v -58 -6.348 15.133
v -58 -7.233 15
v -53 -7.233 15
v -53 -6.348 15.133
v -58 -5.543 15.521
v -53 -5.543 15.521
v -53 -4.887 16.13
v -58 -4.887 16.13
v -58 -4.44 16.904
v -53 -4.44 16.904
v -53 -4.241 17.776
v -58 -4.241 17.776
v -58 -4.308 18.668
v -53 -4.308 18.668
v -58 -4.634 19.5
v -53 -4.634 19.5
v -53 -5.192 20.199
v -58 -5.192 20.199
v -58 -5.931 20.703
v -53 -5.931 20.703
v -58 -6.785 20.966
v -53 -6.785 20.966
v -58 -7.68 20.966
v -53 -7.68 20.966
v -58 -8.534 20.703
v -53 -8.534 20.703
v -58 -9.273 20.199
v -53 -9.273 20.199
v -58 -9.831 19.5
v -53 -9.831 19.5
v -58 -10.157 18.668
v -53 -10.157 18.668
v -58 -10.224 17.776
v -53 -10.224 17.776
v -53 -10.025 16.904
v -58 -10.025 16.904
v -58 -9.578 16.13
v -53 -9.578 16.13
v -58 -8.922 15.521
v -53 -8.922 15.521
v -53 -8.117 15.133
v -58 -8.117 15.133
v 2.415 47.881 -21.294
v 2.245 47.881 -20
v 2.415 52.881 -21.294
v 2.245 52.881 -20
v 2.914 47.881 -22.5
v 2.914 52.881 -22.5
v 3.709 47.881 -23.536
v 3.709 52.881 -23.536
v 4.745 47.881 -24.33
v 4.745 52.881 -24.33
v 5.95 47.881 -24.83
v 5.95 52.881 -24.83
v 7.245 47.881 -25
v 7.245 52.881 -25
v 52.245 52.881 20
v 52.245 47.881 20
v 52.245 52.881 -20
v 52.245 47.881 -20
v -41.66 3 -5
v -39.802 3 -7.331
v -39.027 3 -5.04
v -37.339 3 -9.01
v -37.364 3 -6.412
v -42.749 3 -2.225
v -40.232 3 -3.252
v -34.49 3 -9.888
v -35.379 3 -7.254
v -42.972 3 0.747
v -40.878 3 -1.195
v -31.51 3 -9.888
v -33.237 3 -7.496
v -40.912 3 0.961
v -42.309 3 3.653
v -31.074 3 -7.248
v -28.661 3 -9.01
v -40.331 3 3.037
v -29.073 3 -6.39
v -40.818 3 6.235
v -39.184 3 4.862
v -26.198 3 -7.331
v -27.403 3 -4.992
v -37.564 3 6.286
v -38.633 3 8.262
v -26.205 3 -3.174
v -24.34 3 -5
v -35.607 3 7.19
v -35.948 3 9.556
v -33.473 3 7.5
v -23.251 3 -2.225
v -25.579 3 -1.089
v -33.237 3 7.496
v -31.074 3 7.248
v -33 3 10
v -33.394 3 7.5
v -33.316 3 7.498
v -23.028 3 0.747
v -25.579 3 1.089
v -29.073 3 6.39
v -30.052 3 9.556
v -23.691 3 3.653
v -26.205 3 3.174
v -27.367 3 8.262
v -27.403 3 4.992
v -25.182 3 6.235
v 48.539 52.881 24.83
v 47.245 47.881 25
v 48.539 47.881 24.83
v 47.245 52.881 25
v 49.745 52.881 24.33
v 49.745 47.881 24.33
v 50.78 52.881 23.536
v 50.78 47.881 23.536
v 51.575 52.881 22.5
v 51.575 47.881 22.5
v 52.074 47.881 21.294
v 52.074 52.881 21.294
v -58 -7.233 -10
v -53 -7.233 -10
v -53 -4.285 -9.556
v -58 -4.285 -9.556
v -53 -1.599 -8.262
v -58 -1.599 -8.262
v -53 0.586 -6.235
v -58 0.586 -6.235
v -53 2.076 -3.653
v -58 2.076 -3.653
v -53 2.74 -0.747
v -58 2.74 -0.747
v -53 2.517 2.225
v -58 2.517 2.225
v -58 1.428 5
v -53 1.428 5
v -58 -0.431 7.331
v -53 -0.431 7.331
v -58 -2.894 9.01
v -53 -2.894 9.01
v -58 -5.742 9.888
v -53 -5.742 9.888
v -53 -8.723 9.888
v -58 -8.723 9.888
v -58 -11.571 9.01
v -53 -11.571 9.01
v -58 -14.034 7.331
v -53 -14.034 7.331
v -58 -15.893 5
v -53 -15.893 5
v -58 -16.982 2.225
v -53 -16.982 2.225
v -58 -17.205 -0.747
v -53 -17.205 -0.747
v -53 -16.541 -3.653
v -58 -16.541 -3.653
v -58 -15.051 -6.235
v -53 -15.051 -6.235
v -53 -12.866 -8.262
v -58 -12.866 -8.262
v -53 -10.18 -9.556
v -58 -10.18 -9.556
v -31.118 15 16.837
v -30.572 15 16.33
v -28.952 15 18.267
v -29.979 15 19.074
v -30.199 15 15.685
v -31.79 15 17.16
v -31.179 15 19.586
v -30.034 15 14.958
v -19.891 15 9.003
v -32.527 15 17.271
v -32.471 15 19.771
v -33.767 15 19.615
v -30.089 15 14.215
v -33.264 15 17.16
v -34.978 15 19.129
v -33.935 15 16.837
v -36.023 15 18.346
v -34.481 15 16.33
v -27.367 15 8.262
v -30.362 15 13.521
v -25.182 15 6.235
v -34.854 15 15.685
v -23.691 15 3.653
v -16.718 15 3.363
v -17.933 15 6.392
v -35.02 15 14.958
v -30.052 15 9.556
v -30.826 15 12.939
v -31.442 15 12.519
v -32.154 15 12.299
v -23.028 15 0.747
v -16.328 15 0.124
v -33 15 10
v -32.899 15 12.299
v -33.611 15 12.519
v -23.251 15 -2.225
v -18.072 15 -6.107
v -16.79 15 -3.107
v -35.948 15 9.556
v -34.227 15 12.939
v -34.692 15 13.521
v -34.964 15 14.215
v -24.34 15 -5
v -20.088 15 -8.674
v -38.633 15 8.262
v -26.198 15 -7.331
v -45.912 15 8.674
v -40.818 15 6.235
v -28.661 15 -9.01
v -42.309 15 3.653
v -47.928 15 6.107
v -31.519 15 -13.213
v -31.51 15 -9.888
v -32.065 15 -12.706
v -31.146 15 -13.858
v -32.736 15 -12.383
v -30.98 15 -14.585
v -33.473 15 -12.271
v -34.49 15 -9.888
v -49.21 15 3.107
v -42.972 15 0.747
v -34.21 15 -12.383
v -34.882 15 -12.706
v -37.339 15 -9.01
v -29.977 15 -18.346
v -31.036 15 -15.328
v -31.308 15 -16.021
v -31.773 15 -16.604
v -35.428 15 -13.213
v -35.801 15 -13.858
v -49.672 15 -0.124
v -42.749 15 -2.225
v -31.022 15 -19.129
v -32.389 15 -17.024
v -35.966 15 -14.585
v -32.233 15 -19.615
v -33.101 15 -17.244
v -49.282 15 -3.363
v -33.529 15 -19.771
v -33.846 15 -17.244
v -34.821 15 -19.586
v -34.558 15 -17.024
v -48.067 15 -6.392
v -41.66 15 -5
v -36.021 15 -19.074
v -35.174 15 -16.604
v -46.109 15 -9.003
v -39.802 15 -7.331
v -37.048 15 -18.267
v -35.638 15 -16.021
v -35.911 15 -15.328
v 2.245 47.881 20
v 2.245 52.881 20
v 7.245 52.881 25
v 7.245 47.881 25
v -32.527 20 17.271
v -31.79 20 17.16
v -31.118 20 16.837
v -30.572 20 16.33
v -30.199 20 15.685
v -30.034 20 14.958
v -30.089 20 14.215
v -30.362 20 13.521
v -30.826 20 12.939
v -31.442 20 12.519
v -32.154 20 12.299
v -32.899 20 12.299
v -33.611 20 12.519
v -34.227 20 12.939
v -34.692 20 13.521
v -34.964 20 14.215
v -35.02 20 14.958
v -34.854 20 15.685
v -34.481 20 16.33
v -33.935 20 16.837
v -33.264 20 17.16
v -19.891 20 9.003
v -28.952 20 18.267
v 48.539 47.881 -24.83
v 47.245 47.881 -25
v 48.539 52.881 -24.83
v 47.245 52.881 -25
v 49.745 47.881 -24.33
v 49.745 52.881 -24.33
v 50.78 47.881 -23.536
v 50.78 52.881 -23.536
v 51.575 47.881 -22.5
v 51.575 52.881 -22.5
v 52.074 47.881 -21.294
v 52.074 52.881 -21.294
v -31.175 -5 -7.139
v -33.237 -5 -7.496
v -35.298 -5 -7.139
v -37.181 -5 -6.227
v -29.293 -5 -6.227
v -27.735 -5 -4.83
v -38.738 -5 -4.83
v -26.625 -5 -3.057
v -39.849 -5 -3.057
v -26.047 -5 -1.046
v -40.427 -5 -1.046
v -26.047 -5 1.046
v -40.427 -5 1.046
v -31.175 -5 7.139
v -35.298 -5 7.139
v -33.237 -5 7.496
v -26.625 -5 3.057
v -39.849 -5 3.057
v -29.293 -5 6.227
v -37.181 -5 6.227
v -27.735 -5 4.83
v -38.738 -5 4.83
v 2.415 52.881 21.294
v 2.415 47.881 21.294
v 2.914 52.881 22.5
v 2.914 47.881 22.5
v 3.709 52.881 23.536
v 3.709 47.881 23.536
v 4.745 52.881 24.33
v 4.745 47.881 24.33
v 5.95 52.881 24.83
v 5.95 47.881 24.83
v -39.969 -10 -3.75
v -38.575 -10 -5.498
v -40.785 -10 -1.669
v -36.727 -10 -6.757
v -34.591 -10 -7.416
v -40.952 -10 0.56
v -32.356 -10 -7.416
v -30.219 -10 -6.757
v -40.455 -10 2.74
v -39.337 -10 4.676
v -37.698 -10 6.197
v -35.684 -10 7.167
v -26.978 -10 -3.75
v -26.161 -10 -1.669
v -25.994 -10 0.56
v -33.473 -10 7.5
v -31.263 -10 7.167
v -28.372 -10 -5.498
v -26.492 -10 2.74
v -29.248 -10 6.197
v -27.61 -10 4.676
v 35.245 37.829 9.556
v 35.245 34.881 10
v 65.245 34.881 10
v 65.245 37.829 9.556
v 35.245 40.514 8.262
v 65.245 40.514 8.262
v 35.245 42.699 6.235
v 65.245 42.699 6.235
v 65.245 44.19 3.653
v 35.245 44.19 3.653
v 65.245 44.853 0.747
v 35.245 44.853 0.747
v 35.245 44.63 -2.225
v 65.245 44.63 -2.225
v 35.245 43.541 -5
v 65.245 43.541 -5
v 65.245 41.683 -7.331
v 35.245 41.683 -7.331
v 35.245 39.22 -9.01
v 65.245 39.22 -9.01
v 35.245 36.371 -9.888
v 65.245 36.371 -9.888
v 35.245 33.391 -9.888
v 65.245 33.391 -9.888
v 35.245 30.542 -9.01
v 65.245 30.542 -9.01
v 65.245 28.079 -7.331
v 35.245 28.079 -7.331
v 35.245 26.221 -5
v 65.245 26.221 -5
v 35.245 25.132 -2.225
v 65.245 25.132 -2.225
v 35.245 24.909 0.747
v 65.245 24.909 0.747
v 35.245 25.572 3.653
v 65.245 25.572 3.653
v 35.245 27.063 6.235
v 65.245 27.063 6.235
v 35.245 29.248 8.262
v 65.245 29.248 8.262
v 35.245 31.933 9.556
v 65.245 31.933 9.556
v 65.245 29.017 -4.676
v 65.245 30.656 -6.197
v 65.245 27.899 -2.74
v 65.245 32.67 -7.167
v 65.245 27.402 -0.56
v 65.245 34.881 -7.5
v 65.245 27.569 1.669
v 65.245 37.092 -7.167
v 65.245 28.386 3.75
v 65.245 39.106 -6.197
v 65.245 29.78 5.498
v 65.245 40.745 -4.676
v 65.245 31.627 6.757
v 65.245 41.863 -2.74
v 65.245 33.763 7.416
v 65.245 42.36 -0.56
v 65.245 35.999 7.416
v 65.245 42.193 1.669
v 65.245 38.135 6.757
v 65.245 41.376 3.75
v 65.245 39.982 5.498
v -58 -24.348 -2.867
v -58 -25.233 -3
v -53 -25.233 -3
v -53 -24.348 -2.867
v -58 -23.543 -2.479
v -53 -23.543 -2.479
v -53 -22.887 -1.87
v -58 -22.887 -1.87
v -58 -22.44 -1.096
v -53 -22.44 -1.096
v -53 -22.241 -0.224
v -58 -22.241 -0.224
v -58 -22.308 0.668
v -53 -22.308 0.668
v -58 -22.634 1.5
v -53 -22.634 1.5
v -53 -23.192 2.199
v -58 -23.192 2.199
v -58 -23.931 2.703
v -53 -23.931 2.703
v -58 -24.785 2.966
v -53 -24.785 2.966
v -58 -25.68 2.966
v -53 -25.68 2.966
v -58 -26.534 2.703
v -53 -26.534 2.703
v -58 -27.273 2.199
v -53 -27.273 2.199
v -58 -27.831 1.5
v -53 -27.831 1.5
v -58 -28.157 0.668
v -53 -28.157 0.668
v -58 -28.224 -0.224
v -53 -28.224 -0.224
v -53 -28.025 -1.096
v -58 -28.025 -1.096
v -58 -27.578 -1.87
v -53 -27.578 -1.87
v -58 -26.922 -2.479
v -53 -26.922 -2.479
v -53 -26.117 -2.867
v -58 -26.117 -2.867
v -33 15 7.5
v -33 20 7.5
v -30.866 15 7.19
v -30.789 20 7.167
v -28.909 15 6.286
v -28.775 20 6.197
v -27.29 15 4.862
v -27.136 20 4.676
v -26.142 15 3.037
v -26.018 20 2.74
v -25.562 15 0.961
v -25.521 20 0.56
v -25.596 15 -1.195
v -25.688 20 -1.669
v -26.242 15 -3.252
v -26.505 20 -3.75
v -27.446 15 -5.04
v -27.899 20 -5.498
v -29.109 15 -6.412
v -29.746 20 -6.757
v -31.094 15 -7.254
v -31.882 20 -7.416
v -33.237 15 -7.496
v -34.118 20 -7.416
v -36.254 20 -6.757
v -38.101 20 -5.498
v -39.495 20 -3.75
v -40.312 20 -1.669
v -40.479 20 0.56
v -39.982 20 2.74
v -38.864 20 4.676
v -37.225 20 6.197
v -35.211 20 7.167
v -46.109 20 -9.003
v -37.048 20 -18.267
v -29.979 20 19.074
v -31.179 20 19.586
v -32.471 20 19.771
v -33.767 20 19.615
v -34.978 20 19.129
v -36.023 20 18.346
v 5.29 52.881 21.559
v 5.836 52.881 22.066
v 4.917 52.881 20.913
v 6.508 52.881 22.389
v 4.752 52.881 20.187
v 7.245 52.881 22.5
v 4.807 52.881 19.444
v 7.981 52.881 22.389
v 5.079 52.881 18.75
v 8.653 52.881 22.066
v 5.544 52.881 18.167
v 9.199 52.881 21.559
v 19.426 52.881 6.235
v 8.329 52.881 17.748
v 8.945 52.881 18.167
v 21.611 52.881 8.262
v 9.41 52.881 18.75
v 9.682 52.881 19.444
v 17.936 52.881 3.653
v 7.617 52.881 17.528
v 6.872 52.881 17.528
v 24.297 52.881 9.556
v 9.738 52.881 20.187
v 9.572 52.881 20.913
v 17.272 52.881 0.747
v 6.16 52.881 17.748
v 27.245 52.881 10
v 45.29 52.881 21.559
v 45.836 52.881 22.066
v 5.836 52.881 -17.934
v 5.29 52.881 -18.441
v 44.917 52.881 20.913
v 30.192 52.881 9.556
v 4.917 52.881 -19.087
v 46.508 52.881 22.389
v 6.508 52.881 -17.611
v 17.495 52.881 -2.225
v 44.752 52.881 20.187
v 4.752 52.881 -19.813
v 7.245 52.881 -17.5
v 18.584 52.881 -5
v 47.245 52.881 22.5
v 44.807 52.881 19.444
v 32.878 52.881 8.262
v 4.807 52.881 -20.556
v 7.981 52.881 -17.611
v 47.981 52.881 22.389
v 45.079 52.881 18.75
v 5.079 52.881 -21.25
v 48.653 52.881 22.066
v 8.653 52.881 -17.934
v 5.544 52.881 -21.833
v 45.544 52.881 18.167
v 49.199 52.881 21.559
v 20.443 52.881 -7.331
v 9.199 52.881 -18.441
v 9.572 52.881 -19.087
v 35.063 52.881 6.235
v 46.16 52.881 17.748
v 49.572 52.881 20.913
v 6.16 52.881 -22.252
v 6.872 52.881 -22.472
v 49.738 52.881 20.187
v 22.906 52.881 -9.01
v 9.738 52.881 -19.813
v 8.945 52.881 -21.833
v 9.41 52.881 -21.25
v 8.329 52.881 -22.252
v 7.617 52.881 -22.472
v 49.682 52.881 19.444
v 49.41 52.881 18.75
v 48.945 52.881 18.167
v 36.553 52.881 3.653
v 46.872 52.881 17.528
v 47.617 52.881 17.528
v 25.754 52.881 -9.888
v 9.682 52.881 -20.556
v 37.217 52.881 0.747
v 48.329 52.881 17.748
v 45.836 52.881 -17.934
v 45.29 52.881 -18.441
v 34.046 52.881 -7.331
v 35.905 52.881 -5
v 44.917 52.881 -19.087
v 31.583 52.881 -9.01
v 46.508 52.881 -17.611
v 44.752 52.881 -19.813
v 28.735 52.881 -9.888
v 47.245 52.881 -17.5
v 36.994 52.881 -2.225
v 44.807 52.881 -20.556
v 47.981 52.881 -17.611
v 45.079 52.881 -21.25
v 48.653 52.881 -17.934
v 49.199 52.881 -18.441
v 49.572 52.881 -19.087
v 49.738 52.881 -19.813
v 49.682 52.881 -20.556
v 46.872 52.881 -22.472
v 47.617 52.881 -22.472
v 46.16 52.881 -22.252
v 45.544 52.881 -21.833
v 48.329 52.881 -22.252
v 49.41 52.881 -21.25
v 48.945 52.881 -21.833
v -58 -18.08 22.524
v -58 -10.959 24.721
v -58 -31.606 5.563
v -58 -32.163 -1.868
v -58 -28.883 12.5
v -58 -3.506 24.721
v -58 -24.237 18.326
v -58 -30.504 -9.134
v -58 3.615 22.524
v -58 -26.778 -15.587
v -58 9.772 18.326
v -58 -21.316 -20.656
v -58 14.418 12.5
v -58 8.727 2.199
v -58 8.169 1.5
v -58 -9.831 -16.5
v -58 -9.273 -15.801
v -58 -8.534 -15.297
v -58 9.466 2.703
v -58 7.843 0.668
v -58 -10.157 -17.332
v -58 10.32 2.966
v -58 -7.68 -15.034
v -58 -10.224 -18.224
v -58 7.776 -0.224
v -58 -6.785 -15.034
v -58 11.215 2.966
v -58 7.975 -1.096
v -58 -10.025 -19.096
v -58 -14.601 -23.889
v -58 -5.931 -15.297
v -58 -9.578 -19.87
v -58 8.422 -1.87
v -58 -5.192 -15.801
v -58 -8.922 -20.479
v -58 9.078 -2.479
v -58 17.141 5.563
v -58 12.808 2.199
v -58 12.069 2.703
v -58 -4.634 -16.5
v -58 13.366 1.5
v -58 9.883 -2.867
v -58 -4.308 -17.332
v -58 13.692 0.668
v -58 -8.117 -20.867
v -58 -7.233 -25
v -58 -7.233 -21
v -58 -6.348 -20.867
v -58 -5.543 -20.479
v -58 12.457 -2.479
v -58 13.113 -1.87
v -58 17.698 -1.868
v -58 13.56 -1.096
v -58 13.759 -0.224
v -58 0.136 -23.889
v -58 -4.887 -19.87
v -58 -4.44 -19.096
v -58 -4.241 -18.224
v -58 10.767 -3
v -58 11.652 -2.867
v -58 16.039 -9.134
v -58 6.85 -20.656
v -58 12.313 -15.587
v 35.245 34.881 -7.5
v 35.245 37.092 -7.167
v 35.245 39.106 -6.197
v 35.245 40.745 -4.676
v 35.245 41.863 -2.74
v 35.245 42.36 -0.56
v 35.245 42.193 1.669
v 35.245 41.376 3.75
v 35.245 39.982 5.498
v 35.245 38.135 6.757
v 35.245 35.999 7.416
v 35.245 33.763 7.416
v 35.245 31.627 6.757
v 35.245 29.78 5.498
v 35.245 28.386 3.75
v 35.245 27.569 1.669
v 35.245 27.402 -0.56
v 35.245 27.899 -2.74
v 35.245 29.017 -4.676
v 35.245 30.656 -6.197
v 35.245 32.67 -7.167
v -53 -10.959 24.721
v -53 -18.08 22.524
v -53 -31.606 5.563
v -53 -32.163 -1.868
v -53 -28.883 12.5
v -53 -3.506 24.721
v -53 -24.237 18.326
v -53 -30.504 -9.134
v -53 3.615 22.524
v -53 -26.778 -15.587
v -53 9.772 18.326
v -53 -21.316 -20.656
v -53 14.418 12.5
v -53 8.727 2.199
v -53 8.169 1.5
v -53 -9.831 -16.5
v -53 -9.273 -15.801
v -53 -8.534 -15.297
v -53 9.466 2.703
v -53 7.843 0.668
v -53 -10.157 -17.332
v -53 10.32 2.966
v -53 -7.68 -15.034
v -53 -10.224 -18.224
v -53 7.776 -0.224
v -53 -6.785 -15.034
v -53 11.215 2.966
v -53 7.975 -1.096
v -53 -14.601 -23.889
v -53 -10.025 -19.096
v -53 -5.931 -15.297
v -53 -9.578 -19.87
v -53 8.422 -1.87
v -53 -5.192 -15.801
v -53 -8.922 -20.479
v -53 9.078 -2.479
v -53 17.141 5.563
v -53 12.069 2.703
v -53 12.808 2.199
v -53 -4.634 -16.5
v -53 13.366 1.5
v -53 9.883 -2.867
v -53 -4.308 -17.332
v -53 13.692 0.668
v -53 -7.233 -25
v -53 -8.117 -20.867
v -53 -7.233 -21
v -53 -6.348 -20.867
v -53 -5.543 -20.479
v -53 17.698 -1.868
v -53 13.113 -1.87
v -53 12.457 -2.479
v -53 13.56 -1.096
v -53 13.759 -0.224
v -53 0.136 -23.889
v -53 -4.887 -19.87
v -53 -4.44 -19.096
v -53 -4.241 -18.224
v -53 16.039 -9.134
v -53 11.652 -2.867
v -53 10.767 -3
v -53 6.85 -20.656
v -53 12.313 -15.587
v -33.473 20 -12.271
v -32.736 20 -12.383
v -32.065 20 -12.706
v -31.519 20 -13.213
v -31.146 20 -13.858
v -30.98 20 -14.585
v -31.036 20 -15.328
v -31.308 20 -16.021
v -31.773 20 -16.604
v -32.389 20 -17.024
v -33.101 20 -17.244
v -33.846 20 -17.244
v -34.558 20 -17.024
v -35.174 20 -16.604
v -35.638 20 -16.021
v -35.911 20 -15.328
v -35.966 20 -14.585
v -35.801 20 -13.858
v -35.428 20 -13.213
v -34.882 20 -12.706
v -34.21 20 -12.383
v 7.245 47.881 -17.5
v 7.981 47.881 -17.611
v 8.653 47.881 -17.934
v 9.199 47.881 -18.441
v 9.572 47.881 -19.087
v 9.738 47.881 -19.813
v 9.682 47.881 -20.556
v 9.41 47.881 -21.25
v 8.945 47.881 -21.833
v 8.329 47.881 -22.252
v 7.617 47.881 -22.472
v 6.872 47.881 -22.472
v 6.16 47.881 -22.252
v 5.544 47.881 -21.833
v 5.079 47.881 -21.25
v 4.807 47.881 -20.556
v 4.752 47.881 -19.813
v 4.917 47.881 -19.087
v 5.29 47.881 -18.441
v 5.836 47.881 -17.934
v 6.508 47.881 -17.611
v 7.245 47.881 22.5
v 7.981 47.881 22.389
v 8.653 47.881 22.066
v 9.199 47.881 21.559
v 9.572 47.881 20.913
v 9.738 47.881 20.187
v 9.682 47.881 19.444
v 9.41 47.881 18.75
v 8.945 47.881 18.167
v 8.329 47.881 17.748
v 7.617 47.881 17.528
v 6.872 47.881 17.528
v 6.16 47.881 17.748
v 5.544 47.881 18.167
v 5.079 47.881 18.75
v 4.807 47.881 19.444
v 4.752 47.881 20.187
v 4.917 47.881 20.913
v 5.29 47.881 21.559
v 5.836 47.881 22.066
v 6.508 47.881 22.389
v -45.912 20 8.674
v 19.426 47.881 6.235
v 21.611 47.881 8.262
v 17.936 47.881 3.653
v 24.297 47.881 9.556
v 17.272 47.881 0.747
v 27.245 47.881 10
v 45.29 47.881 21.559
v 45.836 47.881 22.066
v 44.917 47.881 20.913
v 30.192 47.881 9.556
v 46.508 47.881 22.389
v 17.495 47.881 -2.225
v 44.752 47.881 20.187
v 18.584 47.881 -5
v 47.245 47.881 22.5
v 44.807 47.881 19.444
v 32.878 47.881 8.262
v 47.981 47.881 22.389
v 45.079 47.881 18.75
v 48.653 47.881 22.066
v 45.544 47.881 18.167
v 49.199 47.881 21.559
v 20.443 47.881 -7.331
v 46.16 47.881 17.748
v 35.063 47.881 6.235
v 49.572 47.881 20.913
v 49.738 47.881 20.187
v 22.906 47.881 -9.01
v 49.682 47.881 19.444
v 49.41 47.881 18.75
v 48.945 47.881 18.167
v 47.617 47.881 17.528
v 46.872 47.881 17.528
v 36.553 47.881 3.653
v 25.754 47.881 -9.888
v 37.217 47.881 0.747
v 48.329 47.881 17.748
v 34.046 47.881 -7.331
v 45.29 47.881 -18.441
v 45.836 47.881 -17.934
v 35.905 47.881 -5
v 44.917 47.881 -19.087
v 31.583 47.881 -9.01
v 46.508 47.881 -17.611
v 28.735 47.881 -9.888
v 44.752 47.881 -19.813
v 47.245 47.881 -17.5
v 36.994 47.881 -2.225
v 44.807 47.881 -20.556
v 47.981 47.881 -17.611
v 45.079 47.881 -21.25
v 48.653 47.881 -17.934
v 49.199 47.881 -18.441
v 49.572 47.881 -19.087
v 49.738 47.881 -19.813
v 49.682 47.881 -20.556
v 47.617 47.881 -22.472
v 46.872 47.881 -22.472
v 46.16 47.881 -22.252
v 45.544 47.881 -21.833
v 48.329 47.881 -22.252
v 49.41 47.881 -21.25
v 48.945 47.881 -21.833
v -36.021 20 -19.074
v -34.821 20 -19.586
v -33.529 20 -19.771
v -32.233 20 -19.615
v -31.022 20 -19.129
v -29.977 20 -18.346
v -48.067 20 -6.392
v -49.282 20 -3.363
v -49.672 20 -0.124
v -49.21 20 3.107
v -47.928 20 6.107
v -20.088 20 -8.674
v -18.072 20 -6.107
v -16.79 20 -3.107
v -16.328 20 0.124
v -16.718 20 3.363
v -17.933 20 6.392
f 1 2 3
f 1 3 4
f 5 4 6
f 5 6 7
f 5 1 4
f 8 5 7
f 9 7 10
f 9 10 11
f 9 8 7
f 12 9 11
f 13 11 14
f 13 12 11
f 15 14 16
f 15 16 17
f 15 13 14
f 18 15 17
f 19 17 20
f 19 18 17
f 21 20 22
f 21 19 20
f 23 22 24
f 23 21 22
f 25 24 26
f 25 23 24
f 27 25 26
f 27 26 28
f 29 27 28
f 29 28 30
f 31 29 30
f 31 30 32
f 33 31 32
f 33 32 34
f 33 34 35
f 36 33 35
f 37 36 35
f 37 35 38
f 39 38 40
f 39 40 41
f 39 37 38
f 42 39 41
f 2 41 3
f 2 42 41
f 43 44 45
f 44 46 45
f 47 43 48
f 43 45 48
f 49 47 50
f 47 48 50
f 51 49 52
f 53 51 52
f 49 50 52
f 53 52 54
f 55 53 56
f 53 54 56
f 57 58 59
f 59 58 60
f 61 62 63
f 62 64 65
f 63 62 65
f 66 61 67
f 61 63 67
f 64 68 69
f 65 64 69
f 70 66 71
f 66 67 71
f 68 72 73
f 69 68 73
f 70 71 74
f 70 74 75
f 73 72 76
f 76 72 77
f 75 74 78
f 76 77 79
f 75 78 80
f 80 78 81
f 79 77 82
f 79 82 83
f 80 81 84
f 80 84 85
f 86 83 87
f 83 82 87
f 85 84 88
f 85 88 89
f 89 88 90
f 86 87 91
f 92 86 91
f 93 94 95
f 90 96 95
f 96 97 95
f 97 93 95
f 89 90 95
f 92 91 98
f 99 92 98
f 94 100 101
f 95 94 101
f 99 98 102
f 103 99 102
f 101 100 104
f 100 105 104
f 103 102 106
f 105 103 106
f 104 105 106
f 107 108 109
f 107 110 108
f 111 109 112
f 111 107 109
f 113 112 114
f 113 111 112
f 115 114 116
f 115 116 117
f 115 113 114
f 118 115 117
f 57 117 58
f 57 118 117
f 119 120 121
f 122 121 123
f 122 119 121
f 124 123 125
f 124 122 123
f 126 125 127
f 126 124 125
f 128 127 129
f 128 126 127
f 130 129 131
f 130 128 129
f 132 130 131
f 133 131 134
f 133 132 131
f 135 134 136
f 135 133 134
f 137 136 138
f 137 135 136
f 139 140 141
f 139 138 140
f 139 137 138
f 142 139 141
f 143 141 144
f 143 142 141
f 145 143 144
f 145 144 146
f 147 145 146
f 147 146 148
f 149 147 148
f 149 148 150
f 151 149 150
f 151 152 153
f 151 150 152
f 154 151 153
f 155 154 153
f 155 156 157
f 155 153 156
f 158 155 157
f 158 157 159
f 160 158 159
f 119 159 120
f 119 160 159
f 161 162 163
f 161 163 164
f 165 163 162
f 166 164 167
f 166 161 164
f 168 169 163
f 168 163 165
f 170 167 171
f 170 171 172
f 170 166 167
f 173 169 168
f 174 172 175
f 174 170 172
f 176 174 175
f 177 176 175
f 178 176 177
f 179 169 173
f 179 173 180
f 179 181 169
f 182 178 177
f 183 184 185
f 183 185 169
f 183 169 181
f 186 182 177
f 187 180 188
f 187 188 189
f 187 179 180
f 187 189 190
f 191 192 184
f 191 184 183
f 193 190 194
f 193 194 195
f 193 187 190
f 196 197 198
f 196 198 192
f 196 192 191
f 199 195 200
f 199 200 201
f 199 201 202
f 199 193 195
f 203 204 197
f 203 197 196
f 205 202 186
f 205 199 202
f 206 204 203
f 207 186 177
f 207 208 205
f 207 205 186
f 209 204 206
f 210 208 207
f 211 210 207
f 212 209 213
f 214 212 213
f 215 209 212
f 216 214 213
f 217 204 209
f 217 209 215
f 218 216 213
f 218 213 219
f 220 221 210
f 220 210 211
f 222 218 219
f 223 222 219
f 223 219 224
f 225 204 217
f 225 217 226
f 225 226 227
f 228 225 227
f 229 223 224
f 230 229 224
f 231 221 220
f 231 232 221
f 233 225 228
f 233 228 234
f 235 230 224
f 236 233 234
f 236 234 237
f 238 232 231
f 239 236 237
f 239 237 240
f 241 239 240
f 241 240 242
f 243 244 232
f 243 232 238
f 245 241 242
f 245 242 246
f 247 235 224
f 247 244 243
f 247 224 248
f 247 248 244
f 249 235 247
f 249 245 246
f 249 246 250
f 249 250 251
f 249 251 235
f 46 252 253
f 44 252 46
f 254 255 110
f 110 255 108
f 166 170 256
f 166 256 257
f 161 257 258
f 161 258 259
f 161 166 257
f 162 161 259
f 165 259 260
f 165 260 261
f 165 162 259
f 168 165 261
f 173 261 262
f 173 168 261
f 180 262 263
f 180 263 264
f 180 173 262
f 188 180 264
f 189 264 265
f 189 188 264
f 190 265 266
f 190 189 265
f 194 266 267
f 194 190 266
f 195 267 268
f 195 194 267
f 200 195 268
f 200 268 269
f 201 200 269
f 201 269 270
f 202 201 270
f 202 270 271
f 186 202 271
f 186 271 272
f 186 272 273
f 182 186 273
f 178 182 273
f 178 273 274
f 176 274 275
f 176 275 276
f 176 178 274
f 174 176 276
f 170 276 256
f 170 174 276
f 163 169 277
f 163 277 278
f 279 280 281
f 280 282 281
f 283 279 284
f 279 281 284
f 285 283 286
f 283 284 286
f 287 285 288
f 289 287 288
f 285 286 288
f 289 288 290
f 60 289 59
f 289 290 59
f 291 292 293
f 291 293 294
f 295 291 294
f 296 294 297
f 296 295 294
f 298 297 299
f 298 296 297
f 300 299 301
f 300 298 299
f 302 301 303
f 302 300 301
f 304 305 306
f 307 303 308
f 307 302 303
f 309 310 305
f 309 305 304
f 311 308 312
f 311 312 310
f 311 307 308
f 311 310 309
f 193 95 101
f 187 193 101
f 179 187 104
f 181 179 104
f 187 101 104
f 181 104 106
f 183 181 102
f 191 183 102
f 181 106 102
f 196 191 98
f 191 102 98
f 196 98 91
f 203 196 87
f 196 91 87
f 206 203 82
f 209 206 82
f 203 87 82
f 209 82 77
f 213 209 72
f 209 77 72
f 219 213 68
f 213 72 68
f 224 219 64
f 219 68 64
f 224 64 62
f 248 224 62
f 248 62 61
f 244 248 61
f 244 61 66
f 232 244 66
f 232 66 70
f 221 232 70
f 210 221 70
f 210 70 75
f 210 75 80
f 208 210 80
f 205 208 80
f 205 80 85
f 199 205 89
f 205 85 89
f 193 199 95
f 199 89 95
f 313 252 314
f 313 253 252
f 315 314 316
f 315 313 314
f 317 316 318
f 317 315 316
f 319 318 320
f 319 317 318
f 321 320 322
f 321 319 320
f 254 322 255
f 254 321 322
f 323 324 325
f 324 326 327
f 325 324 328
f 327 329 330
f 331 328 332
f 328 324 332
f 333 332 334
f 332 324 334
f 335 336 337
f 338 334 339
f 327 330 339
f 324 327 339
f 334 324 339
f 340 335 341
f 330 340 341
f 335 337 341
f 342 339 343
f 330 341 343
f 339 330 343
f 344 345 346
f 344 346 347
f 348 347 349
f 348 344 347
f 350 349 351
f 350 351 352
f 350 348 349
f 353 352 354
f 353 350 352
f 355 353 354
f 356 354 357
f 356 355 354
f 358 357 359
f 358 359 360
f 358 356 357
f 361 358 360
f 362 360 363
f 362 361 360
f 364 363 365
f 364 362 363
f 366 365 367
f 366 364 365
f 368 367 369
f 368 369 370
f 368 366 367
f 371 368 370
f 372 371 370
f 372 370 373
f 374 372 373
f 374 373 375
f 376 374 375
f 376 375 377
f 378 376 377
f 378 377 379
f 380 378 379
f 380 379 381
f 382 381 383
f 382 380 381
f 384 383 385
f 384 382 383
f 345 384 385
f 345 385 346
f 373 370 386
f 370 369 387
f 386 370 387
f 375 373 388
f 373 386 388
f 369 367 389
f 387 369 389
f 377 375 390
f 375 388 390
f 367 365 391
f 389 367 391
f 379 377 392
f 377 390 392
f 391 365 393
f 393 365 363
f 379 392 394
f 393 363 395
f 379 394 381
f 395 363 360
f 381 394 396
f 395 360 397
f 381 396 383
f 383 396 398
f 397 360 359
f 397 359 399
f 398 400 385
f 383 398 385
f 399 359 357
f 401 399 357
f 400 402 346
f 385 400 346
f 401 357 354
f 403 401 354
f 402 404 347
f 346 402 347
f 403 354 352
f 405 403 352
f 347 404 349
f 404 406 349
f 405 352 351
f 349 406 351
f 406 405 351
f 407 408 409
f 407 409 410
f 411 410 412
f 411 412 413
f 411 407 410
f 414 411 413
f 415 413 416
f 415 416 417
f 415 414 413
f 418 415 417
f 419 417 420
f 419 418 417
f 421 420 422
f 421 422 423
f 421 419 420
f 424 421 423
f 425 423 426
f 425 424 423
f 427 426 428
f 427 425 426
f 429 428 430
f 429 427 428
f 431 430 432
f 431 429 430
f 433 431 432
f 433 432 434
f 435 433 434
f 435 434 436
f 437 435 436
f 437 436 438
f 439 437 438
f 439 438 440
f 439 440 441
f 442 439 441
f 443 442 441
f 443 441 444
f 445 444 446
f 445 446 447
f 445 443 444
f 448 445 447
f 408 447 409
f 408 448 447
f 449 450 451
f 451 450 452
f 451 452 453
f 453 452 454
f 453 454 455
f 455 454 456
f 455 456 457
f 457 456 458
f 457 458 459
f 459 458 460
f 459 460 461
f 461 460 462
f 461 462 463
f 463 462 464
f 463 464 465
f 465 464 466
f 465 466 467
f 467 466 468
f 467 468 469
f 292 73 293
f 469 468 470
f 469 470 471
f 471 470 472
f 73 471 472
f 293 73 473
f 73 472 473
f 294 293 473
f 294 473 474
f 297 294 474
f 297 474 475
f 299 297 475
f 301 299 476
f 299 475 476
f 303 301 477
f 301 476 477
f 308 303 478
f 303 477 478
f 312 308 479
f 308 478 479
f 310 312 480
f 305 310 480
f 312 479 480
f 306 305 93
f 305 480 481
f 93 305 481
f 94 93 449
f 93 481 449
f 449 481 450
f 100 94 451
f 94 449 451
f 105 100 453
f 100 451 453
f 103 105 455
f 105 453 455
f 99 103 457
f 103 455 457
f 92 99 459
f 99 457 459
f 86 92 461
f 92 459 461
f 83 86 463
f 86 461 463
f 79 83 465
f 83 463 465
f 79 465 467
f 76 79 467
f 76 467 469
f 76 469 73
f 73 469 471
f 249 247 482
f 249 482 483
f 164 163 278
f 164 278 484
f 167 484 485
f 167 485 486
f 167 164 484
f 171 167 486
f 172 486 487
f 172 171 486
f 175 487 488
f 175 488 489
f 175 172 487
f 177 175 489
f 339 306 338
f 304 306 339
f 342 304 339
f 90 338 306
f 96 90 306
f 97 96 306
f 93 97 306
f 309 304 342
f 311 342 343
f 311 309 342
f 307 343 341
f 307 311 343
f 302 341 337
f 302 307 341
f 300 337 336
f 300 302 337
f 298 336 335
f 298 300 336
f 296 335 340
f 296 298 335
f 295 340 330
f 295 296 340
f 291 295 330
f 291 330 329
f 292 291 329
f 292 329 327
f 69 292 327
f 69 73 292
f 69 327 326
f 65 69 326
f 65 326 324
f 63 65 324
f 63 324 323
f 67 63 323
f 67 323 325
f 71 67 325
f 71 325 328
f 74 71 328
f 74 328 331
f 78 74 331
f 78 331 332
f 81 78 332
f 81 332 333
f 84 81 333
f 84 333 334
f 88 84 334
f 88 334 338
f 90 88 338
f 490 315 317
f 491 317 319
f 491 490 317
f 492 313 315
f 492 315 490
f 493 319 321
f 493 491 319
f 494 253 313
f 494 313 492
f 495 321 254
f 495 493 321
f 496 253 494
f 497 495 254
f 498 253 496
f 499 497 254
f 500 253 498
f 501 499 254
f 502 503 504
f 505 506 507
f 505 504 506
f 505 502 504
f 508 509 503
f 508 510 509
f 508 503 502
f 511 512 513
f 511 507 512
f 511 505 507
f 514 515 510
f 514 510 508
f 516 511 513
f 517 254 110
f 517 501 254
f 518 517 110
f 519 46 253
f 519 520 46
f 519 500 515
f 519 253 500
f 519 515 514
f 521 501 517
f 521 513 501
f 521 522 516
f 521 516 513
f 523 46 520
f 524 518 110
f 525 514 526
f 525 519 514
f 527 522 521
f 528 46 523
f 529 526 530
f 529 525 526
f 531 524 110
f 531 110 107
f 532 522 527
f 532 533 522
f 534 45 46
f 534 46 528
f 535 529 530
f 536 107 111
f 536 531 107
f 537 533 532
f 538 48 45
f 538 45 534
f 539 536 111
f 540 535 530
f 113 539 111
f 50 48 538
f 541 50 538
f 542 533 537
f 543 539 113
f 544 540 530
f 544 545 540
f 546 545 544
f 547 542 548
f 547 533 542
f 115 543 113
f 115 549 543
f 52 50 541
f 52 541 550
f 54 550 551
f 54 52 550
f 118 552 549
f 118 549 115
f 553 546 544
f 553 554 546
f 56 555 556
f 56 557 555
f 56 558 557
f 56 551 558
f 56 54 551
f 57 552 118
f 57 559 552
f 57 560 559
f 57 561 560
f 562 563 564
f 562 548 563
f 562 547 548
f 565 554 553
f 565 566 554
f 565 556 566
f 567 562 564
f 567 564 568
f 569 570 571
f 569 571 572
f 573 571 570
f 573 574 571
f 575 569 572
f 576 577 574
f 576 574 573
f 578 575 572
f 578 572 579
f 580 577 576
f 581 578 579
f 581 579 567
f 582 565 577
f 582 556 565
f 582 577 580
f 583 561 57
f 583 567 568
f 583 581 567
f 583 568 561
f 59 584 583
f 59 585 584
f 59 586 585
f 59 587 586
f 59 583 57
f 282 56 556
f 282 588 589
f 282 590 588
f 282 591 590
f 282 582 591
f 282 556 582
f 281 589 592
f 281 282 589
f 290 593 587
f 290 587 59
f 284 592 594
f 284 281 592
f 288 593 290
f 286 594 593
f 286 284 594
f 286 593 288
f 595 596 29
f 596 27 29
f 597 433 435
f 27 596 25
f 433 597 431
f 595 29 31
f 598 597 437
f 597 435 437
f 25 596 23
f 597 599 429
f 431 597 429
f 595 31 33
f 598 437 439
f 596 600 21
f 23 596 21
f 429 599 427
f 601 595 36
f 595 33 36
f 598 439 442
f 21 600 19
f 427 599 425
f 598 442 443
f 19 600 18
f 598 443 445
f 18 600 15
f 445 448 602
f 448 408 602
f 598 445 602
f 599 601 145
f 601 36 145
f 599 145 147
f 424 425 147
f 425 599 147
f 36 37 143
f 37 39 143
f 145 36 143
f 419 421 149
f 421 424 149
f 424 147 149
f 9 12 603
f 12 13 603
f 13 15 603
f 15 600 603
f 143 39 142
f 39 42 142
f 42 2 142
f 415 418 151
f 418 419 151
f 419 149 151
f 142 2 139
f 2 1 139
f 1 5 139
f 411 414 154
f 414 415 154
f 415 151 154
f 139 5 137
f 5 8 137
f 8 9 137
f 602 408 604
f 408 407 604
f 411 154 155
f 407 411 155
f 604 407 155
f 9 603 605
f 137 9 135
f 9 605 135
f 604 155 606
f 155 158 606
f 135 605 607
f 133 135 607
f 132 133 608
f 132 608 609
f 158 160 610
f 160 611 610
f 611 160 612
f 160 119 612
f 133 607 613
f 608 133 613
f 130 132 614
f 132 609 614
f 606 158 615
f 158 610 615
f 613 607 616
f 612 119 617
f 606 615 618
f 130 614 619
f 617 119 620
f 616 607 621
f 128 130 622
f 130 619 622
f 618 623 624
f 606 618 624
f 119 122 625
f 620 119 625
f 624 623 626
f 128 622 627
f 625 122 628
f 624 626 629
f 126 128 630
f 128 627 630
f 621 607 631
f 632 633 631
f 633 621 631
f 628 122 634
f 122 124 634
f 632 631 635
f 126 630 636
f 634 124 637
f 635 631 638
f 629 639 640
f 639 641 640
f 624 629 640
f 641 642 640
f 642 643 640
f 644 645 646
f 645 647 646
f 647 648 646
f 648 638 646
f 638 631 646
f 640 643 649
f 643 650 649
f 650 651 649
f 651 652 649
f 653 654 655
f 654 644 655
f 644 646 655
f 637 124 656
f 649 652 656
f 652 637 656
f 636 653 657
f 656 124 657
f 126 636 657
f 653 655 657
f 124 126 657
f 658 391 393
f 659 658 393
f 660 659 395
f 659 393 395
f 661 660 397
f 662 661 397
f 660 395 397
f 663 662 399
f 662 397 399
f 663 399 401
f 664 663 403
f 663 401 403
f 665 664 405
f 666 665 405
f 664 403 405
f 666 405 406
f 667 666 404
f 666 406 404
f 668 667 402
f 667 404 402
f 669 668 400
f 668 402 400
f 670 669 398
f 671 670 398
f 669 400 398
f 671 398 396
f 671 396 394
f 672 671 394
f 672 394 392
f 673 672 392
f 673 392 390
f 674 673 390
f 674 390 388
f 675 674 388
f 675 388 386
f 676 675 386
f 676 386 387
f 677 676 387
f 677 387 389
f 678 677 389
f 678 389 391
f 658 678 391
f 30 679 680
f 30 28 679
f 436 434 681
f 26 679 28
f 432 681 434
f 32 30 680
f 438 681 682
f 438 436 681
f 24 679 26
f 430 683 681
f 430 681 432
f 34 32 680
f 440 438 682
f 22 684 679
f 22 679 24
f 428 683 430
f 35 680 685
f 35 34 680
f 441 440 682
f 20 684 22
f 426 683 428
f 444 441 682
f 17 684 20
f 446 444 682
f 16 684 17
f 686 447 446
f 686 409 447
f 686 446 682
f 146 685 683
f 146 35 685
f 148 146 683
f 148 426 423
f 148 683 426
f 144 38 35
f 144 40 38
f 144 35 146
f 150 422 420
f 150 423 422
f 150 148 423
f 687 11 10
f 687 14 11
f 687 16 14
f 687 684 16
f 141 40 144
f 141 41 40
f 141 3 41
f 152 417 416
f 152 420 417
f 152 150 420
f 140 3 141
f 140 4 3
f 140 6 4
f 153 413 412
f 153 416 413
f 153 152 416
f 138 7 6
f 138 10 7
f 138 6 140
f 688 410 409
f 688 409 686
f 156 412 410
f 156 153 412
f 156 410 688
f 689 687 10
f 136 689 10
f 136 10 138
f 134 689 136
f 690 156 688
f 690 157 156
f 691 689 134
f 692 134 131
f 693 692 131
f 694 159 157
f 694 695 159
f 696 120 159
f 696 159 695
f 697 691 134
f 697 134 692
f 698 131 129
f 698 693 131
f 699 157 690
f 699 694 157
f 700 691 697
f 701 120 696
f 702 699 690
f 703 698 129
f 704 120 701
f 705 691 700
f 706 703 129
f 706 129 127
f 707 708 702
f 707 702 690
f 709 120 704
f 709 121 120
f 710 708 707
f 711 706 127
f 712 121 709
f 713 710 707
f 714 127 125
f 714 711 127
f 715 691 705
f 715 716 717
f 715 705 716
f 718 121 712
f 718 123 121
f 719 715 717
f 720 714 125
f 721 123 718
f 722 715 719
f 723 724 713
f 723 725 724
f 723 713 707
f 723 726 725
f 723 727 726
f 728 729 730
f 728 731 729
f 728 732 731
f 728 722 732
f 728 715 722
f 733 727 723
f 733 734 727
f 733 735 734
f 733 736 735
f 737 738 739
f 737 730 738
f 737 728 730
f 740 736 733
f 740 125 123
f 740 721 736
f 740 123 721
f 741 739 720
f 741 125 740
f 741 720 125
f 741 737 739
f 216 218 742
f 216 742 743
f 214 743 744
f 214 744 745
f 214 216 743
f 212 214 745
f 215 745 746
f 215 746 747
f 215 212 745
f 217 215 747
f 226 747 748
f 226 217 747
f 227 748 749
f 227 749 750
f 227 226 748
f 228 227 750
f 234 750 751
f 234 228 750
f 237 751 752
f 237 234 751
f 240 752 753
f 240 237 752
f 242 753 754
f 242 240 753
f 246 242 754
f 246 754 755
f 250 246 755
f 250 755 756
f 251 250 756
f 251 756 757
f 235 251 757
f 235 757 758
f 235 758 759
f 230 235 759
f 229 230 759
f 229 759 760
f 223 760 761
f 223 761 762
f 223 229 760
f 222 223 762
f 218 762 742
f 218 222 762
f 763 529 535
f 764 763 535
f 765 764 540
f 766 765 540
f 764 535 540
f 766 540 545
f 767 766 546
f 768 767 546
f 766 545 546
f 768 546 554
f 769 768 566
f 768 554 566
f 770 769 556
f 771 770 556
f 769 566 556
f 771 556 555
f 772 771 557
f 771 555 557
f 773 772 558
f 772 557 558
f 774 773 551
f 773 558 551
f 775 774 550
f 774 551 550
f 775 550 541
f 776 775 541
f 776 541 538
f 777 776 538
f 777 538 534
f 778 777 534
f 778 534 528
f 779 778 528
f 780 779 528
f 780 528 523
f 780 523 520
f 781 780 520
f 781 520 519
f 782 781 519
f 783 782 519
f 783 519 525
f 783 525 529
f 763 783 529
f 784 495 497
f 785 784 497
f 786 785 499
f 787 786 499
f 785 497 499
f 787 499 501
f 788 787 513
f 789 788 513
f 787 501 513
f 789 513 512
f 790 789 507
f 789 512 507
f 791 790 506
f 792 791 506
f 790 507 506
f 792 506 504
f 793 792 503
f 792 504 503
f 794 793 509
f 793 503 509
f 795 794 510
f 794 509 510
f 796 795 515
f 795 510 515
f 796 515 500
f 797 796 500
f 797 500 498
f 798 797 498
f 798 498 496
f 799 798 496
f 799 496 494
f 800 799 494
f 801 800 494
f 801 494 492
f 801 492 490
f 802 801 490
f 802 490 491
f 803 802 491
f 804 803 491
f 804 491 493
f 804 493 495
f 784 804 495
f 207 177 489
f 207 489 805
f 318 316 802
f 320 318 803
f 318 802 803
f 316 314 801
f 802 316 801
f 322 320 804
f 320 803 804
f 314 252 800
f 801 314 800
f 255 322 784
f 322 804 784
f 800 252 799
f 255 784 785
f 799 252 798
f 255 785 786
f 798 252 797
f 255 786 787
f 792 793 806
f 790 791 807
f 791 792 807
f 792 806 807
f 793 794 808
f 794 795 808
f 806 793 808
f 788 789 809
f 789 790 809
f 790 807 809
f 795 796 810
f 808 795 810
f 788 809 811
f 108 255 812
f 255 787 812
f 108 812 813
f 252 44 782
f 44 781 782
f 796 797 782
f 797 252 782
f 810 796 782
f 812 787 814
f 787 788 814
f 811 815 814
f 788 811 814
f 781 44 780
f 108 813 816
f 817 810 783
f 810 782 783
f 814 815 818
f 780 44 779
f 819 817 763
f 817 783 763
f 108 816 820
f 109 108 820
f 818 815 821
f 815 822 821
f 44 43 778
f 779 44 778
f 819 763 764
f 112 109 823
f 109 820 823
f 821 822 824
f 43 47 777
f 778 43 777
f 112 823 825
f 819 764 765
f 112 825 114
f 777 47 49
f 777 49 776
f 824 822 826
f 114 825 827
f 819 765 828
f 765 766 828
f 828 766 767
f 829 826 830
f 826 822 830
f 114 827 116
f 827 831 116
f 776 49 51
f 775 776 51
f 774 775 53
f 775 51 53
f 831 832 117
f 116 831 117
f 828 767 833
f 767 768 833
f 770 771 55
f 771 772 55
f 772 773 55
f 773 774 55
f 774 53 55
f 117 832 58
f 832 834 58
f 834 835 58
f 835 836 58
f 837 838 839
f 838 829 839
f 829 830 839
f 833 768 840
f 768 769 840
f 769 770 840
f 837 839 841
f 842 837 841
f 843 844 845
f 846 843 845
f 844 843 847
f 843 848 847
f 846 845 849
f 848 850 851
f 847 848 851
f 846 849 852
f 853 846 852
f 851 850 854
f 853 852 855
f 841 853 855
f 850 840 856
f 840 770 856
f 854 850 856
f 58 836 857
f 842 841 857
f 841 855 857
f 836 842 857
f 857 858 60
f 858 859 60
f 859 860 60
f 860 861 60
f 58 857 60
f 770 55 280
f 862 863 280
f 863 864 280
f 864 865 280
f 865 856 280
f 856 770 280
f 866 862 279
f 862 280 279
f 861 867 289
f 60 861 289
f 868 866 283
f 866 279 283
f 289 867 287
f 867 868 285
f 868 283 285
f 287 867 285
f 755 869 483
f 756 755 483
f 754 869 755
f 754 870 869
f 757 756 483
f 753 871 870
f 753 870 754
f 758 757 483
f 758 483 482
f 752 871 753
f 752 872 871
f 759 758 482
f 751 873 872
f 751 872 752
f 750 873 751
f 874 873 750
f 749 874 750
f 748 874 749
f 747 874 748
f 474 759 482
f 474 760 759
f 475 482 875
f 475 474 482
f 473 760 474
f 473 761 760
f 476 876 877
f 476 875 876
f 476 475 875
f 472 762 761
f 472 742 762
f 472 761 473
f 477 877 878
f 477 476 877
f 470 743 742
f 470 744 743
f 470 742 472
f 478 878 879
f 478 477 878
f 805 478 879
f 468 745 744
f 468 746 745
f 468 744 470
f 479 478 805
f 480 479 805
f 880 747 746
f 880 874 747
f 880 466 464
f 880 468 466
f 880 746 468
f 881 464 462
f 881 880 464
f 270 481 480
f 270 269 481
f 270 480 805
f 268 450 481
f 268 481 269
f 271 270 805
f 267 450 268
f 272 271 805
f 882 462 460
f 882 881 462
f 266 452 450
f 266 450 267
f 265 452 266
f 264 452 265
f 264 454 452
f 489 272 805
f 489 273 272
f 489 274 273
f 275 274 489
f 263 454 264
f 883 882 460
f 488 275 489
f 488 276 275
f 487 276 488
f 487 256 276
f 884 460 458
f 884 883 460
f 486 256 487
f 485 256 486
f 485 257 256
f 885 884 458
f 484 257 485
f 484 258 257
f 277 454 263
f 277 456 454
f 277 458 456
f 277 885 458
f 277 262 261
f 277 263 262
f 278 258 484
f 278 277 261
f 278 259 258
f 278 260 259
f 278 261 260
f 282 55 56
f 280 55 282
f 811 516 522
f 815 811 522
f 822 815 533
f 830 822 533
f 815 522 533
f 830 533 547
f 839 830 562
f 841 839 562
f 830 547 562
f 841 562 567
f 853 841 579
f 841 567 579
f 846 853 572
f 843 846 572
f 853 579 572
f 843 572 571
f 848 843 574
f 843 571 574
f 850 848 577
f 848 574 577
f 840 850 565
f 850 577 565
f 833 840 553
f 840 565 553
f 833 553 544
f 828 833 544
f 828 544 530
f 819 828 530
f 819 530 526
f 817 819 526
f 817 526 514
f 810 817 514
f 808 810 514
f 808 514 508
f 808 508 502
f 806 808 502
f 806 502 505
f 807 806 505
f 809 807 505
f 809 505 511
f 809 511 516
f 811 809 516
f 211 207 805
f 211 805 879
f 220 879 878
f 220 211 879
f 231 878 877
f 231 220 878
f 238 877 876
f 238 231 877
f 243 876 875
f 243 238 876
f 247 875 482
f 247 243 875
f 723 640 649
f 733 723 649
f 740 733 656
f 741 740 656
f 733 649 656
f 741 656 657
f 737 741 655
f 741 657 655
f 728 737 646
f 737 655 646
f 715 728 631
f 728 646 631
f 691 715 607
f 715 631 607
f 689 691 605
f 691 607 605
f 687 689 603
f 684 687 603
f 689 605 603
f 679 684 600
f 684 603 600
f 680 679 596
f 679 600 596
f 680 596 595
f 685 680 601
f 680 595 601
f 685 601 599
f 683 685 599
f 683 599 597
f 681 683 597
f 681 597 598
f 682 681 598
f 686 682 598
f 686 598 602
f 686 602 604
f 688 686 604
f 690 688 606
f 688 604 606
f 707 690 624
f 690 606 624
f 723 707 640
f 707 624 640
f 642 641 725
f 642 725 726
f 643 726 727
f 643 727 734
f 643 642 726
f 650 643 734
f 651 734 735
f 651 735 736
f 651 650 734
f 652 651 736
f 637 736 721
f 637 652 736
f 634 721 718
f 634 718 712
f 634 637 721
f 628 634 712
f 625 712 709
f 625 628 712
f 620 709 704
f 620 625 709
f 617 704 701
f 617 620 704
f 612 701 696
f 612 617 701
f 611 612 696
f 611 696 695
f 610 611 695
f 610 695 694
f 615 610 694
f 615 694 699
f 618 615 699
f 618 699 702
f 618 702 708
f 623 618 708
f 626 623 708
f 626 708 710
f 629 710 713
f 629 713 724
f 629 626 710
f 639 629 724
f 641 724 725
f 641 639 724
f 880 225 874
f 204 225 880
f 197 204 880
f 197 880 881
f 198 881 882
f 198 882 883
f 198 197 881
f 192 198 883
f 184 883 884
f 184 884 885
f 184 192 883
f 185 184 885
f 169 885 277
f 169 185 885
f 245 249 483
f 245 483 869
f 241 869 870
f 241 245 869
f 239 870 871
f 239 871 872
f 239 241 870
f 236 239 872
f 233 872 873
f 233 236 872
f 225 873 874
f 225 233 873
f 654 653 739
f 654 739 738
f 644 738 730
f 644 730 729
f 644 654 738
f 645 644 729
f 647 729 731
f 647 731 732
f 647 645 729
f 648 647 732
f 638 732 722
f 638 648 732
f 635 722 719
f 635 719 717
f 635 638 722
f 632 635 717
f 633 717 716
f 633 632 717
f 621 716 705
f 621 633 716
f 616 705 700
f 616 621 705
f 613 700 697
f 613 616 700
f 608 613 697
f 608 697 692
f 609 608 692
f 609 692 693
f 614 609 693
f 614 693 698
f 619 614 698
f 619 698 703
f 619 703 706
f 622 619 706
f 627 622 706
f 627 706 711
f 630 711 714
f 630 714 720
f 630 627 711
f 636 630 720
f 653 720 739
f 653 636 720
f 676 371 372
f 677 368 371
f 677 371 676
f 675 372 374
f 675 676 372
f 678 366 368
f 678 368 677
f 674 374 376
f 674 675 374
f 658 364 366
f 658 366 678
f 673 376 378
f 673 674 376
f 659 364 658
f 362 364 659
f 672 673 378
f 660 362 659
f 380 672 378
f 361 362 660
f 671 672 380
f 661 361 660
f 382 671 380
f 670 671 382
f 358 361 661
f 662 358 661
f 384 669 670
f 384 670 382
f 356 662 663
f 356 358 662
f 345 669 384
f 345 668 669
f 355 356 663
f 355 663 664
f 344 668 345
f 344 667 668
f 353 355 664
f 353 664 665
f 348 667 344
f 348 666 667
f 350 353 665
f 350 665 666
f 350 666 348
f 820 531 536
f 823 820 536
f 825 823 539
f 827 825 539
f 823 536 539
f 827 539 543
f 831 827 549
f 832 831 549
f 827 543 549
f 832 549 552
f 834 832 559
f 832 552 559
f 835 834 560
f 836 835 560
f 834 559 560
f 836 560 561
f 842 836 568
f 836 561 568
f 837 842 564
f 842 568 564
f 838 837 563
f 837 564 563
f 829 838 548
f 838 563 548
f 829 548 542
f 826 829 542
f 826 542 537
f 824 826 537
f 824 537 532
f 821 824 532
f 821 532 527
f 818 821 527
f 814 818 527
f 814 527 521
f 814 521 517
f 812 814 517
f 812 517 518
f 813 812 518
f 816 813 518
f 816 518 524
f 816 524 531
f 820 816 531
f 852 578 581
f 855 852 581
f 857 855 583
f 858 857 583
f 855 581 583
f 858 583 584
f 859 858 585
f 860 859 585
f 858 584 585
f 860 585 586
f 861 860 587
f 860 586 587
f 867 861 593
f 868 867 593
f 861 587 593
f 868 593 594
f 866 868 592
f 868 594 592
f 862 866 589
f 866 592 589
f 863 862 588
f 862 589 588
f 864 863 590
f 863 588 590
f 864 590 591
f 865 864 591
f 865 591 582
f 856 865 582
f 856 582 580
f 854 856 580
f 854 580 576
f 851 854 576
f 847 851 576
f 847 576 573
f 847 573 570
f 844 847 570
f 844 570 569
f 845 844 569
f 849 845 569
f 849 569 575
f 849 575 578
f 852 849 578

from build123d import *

# Parameters (mm, degrees)
EXTRUDE_1_OUTLINE_W = 50
EXTRUDE_1_OUTLINE_H = 50
EXTRUDE_1_DEPTH     = 5
SKETCH_15_R         = 10
CUT_EXTRUDE_1_DEPTH = 8
FILLET_1_R          = 5
SKETCH_16_R         = 2.5
CUT_EXTRUDE_2_DEPTH = 8
SKETCH_17_R         = 25
SKETCH_17_R_2       = 3
EXTRUDE_2_DEPTH     = 5
SKETCH_18_R         = 10
CUT_EXTRUDE_3_DEPTH = 8
EXTRUDE_START       = -2
SKETCH_19_R         = 10
EXTRUDE_3_DEPTH     = 12
EXTRUDE_START_2     = 2
SKETCH_20_R         = 10
EXTRUDE_4_DEPTH     = 30
SKETCH_21_R         = 7.5
CUT_EXTRUDE_4_DEPTH = 35
SKETCH_22_R         = 7.5
CUT_EXTRUDE_5_DEPTH = 25
SKETCH_23_R         = 2.5
EXTRUDE_5_DEPTH     = 5
SKETCH_24_R         = 7.5
EXTRUDE_6_DEPTH     = 30
SKETCH_27_R         = 7.5
CUT_EXTRUDE_6_DEPTH = 25


# Read off the part's stored shape, not the designer's step: 보스-돌출1
with BuildPart() as part:
    # 보스-돌출1 outline → 보스-돌출1 (new body)
    with BuildSketch(Plane(origin=(0, 47.88103287, 0), x_dir=(1, 0, 0), z_dir=(0, 1, 0))):
        with Locations((27.244520639, 0)):
            Rectangle(EXTRUDE_1_OUTLINE_W, EXTRUDE_1_OUTLINE_H)
    extrude(amount=EXTRUDE_1_DEPTH)

    # 스케치15 → 컷-돌출1 (cut)
    with BuildSketch(Plane(origin=(0, 52.88103287, 0), x_dir=(1, 0, 0), z_dir=(0, 1, 0))):
        with Locations(Location((27.244520639, 0, 0), (0, 0, 270))):
            Circle(SKETCH_15_R)
    extrude(amount=-CUT_EXTRUDE_1_DEPTH, mode=Mode.SUBTRACT)

    # 필렛1
    fillet_1_edges = [part.edges().sort_by_distance(p)[0] for p in [
        (52.244520639, 50.38103287, 25),
        (2.244520639, 50.38103287, 25),
        (2.244520639, 50.38103287, -25),
        (52.244520639, 50.38103287, -25),
    ]]
    fillet(fillet_1_edges, radius=FILLET_1_R)

    # 스케치16 → 컷-돌출2 (cut)
    with BuildSketch(Plane(origin=(0, 52.88103287, 0), x_dir=(1, 0, 0), z_dir=(0, 1, 0))):
        with Locations(Location((7.244520639, 20, 0), (0, 0, 270))):
            Circle(SKETCH_16_R)
        with Locations(Location((7.244520639, -20, 0), (0, 0, 270))):
            Circle(SKETCH_16_R)
        with Locations(Location((47.244520639, -20, 0), (0, 0, 270))):
            Circle(SKETCH_16_R)
        with Locations(Location((47.244520639, 20, 0), (0, 0, 270))):
            Circle(SKETCH_16_R)
    extrude(amount=-CUT_EXTRUDE_2_DEPTH, mode=Mode.SUBTRACT)


with BuildPart() as body_2:
    # 스케치17 → 보스-돌출2 (new body)
    with BuildSketch(Plane(origin=(-58, 0, 0), x_dir=(0, 0, -1), z_dir=(1, 0, 0))):
        with Locations((0, -7.232514397)):
            Circle(SKETCH_17_R)
        with Locations((0, 10.767485603)):
            Circle(SKETCH_17_R_2, mode=Mode.SUBTRACT)
        with Locations((-18, -7.232514397)):
            Circle(SKETCH_17_R_2, mode=Mode.SUBTRACT)
        with Locations((18, -7.232514397)):
            Circle(SKETCH_17_R_2, mode=Mode.SUBTRACT)
        with Locations((0, -25.232514397)):
            Circle(SKETCH_17_R_2, mode=Mode.SUBTRACT)
    extrude(amount=EXTRUDE_2_DEPTH)

    # 스케치18 → 컷-돌출3 (cut)
    with BuildSketch(Plane(origin=(-58, 0, 0), x_dir=(0, 0, -1), z_dir=(1, 0, 0))):
        with Locations((0, -7.232514397)):
            Circle(SKETCH_18_R)
    extrude(amount=CUT_EXTRUDE_3_DEPTH, mode=Mode.SUBTRACT)


with BuildPart() as body_3:
    # 스케치19 → 보스-돌출3 (new body)
    with BuildSketch(Plane(origin=(0, 5, 0), x_dir=(1, 0, 0), z_dir=(0, 1, 0)).offset(EXTRUDE_START)):
        with Locations(Location((-33, 0, 0), (0, 0, 270))):
            Circle(SKETCH_19_R)
    extrude(amount=EXTRUDE_3_DEPTH)

    # 스케치22 → 컷-돌출5 (cut)
    with BuildSketch(Plane(origin=(0, 15, 0), x_dir=(1, 0, 0), z_dir=(0, 1, 0))):
        with Locations(Location((-33, 0, 0), (0, 0, 270))):
            Circle(SKETCH_22_R)
    extrude(amount=-CUT_EXTRUDE_5_DEPTH, mode=Mode.SUBTRACT)

    # 스케치23 → 보스-돌출5 (add)
    with BuildSketch(Plane(origin=(0, 15, 0), x_dir=(1, 0, 0), z_dir=(0, 1, 0))):
        with BuildLine():
            Line((-29.977373614, 18.346097633), (-20.087613409, 8.67389473))
            ThreePointArc((-20.087613409, 8.67389473), (-16.328380033, -0.123678532), (-19.891024332, -9.002681656))
            Line((-19.891024332, -9.002681656), (-28.951995832, -18.267462002))
            ThreePointArc((-28.951995832, -18.267462002), (-32.471025137, -19.771155352), (-36.022626386, -18.346097633))
            Line((-36.022626386, -18.346097633), (-45.912386591, -8.67389473))
            ThreePointArc((-45.912386591, -8.67389473), (-49.671619967, 0.123678532), (-46.108975668, 9.002681656))
            Line((-46.108975668, 9.002681656), (-37.048004168, 18.267462002))
            ThreePointArc((-37.048004168, 18.267462002), (-33.528974863, 19.771155352), (-29.977373614, 18.346097633))
        make_face()
        with Locations(Location((-33.473371076, 14.77146454, 0), (0, 0, 270))):
            Circle(SKETCH_23_R, mode=Mode.SUBTRACT)
        with Locations(Location((-32.526628924, -14.77146454, 0), (0, 0, 270))):
            Circle(SKETCH_23_R, mode=Mode.SUBTRACT)
    extrude(amount=EXTRUDE_5_DEPTH)

    # 스케치24 → 보스-돌출6 (add)
    with BuildSketch(Plane(origin=(0, 20, 0), x_dir=(1, 0, 0), z_dir=(0, 1, 0))):
        with Locations(Location((-33.473371076, 0, 0), (0, 0, 270))):
            Circle(SKETCH_24_R)
    extrude(amount=-EXTRUDE_6_DEPTH)

    # 스케치27 → 컷-돌출6 (cut)
    with BuildSketch(Plane(origin=(0, 20, 0), x_dir=(1, 0, 0), z_dir=(0, 1, 0))):
        with Locations(Location((-33, 0, 0), (0, 0, 270))):
            Circle(SKETCH_27_R)
    extrude(amount=-CUT_EXTRUDE_6_DEPTH, mode=Mode.SUBTRACT)


with BuildPart() as body_4:
    # 스케치20 → 보스-돌출4 (new body)
    with BuildSketch(Plane.ZY.offset(-37.244520639).offset(EXTRUDE_START_2)):
        with Locations((0, 34.88103287)):
            Circle(SKETCH_20_R)
    extrude(amount=-EXTRUDE_4_DEPTH)

    # 스케치21 → 컷-돌출4 (cut)
    with BuildSketch(Plane(origin=(65.244520639, 0, 0), x_dir=(0, 0, -1), z_dir=(1, 0, 0))):
        with Locations((0, 34.88103287)):
            Circle(SKETCH_21_R)
    extrude(amount=-CUT_EXTRUDE_4_DEPTH, mode=Mode.SUBTRACT)


solid = Compound([part.part, body_2.part, body_3.part, body_4.part])
